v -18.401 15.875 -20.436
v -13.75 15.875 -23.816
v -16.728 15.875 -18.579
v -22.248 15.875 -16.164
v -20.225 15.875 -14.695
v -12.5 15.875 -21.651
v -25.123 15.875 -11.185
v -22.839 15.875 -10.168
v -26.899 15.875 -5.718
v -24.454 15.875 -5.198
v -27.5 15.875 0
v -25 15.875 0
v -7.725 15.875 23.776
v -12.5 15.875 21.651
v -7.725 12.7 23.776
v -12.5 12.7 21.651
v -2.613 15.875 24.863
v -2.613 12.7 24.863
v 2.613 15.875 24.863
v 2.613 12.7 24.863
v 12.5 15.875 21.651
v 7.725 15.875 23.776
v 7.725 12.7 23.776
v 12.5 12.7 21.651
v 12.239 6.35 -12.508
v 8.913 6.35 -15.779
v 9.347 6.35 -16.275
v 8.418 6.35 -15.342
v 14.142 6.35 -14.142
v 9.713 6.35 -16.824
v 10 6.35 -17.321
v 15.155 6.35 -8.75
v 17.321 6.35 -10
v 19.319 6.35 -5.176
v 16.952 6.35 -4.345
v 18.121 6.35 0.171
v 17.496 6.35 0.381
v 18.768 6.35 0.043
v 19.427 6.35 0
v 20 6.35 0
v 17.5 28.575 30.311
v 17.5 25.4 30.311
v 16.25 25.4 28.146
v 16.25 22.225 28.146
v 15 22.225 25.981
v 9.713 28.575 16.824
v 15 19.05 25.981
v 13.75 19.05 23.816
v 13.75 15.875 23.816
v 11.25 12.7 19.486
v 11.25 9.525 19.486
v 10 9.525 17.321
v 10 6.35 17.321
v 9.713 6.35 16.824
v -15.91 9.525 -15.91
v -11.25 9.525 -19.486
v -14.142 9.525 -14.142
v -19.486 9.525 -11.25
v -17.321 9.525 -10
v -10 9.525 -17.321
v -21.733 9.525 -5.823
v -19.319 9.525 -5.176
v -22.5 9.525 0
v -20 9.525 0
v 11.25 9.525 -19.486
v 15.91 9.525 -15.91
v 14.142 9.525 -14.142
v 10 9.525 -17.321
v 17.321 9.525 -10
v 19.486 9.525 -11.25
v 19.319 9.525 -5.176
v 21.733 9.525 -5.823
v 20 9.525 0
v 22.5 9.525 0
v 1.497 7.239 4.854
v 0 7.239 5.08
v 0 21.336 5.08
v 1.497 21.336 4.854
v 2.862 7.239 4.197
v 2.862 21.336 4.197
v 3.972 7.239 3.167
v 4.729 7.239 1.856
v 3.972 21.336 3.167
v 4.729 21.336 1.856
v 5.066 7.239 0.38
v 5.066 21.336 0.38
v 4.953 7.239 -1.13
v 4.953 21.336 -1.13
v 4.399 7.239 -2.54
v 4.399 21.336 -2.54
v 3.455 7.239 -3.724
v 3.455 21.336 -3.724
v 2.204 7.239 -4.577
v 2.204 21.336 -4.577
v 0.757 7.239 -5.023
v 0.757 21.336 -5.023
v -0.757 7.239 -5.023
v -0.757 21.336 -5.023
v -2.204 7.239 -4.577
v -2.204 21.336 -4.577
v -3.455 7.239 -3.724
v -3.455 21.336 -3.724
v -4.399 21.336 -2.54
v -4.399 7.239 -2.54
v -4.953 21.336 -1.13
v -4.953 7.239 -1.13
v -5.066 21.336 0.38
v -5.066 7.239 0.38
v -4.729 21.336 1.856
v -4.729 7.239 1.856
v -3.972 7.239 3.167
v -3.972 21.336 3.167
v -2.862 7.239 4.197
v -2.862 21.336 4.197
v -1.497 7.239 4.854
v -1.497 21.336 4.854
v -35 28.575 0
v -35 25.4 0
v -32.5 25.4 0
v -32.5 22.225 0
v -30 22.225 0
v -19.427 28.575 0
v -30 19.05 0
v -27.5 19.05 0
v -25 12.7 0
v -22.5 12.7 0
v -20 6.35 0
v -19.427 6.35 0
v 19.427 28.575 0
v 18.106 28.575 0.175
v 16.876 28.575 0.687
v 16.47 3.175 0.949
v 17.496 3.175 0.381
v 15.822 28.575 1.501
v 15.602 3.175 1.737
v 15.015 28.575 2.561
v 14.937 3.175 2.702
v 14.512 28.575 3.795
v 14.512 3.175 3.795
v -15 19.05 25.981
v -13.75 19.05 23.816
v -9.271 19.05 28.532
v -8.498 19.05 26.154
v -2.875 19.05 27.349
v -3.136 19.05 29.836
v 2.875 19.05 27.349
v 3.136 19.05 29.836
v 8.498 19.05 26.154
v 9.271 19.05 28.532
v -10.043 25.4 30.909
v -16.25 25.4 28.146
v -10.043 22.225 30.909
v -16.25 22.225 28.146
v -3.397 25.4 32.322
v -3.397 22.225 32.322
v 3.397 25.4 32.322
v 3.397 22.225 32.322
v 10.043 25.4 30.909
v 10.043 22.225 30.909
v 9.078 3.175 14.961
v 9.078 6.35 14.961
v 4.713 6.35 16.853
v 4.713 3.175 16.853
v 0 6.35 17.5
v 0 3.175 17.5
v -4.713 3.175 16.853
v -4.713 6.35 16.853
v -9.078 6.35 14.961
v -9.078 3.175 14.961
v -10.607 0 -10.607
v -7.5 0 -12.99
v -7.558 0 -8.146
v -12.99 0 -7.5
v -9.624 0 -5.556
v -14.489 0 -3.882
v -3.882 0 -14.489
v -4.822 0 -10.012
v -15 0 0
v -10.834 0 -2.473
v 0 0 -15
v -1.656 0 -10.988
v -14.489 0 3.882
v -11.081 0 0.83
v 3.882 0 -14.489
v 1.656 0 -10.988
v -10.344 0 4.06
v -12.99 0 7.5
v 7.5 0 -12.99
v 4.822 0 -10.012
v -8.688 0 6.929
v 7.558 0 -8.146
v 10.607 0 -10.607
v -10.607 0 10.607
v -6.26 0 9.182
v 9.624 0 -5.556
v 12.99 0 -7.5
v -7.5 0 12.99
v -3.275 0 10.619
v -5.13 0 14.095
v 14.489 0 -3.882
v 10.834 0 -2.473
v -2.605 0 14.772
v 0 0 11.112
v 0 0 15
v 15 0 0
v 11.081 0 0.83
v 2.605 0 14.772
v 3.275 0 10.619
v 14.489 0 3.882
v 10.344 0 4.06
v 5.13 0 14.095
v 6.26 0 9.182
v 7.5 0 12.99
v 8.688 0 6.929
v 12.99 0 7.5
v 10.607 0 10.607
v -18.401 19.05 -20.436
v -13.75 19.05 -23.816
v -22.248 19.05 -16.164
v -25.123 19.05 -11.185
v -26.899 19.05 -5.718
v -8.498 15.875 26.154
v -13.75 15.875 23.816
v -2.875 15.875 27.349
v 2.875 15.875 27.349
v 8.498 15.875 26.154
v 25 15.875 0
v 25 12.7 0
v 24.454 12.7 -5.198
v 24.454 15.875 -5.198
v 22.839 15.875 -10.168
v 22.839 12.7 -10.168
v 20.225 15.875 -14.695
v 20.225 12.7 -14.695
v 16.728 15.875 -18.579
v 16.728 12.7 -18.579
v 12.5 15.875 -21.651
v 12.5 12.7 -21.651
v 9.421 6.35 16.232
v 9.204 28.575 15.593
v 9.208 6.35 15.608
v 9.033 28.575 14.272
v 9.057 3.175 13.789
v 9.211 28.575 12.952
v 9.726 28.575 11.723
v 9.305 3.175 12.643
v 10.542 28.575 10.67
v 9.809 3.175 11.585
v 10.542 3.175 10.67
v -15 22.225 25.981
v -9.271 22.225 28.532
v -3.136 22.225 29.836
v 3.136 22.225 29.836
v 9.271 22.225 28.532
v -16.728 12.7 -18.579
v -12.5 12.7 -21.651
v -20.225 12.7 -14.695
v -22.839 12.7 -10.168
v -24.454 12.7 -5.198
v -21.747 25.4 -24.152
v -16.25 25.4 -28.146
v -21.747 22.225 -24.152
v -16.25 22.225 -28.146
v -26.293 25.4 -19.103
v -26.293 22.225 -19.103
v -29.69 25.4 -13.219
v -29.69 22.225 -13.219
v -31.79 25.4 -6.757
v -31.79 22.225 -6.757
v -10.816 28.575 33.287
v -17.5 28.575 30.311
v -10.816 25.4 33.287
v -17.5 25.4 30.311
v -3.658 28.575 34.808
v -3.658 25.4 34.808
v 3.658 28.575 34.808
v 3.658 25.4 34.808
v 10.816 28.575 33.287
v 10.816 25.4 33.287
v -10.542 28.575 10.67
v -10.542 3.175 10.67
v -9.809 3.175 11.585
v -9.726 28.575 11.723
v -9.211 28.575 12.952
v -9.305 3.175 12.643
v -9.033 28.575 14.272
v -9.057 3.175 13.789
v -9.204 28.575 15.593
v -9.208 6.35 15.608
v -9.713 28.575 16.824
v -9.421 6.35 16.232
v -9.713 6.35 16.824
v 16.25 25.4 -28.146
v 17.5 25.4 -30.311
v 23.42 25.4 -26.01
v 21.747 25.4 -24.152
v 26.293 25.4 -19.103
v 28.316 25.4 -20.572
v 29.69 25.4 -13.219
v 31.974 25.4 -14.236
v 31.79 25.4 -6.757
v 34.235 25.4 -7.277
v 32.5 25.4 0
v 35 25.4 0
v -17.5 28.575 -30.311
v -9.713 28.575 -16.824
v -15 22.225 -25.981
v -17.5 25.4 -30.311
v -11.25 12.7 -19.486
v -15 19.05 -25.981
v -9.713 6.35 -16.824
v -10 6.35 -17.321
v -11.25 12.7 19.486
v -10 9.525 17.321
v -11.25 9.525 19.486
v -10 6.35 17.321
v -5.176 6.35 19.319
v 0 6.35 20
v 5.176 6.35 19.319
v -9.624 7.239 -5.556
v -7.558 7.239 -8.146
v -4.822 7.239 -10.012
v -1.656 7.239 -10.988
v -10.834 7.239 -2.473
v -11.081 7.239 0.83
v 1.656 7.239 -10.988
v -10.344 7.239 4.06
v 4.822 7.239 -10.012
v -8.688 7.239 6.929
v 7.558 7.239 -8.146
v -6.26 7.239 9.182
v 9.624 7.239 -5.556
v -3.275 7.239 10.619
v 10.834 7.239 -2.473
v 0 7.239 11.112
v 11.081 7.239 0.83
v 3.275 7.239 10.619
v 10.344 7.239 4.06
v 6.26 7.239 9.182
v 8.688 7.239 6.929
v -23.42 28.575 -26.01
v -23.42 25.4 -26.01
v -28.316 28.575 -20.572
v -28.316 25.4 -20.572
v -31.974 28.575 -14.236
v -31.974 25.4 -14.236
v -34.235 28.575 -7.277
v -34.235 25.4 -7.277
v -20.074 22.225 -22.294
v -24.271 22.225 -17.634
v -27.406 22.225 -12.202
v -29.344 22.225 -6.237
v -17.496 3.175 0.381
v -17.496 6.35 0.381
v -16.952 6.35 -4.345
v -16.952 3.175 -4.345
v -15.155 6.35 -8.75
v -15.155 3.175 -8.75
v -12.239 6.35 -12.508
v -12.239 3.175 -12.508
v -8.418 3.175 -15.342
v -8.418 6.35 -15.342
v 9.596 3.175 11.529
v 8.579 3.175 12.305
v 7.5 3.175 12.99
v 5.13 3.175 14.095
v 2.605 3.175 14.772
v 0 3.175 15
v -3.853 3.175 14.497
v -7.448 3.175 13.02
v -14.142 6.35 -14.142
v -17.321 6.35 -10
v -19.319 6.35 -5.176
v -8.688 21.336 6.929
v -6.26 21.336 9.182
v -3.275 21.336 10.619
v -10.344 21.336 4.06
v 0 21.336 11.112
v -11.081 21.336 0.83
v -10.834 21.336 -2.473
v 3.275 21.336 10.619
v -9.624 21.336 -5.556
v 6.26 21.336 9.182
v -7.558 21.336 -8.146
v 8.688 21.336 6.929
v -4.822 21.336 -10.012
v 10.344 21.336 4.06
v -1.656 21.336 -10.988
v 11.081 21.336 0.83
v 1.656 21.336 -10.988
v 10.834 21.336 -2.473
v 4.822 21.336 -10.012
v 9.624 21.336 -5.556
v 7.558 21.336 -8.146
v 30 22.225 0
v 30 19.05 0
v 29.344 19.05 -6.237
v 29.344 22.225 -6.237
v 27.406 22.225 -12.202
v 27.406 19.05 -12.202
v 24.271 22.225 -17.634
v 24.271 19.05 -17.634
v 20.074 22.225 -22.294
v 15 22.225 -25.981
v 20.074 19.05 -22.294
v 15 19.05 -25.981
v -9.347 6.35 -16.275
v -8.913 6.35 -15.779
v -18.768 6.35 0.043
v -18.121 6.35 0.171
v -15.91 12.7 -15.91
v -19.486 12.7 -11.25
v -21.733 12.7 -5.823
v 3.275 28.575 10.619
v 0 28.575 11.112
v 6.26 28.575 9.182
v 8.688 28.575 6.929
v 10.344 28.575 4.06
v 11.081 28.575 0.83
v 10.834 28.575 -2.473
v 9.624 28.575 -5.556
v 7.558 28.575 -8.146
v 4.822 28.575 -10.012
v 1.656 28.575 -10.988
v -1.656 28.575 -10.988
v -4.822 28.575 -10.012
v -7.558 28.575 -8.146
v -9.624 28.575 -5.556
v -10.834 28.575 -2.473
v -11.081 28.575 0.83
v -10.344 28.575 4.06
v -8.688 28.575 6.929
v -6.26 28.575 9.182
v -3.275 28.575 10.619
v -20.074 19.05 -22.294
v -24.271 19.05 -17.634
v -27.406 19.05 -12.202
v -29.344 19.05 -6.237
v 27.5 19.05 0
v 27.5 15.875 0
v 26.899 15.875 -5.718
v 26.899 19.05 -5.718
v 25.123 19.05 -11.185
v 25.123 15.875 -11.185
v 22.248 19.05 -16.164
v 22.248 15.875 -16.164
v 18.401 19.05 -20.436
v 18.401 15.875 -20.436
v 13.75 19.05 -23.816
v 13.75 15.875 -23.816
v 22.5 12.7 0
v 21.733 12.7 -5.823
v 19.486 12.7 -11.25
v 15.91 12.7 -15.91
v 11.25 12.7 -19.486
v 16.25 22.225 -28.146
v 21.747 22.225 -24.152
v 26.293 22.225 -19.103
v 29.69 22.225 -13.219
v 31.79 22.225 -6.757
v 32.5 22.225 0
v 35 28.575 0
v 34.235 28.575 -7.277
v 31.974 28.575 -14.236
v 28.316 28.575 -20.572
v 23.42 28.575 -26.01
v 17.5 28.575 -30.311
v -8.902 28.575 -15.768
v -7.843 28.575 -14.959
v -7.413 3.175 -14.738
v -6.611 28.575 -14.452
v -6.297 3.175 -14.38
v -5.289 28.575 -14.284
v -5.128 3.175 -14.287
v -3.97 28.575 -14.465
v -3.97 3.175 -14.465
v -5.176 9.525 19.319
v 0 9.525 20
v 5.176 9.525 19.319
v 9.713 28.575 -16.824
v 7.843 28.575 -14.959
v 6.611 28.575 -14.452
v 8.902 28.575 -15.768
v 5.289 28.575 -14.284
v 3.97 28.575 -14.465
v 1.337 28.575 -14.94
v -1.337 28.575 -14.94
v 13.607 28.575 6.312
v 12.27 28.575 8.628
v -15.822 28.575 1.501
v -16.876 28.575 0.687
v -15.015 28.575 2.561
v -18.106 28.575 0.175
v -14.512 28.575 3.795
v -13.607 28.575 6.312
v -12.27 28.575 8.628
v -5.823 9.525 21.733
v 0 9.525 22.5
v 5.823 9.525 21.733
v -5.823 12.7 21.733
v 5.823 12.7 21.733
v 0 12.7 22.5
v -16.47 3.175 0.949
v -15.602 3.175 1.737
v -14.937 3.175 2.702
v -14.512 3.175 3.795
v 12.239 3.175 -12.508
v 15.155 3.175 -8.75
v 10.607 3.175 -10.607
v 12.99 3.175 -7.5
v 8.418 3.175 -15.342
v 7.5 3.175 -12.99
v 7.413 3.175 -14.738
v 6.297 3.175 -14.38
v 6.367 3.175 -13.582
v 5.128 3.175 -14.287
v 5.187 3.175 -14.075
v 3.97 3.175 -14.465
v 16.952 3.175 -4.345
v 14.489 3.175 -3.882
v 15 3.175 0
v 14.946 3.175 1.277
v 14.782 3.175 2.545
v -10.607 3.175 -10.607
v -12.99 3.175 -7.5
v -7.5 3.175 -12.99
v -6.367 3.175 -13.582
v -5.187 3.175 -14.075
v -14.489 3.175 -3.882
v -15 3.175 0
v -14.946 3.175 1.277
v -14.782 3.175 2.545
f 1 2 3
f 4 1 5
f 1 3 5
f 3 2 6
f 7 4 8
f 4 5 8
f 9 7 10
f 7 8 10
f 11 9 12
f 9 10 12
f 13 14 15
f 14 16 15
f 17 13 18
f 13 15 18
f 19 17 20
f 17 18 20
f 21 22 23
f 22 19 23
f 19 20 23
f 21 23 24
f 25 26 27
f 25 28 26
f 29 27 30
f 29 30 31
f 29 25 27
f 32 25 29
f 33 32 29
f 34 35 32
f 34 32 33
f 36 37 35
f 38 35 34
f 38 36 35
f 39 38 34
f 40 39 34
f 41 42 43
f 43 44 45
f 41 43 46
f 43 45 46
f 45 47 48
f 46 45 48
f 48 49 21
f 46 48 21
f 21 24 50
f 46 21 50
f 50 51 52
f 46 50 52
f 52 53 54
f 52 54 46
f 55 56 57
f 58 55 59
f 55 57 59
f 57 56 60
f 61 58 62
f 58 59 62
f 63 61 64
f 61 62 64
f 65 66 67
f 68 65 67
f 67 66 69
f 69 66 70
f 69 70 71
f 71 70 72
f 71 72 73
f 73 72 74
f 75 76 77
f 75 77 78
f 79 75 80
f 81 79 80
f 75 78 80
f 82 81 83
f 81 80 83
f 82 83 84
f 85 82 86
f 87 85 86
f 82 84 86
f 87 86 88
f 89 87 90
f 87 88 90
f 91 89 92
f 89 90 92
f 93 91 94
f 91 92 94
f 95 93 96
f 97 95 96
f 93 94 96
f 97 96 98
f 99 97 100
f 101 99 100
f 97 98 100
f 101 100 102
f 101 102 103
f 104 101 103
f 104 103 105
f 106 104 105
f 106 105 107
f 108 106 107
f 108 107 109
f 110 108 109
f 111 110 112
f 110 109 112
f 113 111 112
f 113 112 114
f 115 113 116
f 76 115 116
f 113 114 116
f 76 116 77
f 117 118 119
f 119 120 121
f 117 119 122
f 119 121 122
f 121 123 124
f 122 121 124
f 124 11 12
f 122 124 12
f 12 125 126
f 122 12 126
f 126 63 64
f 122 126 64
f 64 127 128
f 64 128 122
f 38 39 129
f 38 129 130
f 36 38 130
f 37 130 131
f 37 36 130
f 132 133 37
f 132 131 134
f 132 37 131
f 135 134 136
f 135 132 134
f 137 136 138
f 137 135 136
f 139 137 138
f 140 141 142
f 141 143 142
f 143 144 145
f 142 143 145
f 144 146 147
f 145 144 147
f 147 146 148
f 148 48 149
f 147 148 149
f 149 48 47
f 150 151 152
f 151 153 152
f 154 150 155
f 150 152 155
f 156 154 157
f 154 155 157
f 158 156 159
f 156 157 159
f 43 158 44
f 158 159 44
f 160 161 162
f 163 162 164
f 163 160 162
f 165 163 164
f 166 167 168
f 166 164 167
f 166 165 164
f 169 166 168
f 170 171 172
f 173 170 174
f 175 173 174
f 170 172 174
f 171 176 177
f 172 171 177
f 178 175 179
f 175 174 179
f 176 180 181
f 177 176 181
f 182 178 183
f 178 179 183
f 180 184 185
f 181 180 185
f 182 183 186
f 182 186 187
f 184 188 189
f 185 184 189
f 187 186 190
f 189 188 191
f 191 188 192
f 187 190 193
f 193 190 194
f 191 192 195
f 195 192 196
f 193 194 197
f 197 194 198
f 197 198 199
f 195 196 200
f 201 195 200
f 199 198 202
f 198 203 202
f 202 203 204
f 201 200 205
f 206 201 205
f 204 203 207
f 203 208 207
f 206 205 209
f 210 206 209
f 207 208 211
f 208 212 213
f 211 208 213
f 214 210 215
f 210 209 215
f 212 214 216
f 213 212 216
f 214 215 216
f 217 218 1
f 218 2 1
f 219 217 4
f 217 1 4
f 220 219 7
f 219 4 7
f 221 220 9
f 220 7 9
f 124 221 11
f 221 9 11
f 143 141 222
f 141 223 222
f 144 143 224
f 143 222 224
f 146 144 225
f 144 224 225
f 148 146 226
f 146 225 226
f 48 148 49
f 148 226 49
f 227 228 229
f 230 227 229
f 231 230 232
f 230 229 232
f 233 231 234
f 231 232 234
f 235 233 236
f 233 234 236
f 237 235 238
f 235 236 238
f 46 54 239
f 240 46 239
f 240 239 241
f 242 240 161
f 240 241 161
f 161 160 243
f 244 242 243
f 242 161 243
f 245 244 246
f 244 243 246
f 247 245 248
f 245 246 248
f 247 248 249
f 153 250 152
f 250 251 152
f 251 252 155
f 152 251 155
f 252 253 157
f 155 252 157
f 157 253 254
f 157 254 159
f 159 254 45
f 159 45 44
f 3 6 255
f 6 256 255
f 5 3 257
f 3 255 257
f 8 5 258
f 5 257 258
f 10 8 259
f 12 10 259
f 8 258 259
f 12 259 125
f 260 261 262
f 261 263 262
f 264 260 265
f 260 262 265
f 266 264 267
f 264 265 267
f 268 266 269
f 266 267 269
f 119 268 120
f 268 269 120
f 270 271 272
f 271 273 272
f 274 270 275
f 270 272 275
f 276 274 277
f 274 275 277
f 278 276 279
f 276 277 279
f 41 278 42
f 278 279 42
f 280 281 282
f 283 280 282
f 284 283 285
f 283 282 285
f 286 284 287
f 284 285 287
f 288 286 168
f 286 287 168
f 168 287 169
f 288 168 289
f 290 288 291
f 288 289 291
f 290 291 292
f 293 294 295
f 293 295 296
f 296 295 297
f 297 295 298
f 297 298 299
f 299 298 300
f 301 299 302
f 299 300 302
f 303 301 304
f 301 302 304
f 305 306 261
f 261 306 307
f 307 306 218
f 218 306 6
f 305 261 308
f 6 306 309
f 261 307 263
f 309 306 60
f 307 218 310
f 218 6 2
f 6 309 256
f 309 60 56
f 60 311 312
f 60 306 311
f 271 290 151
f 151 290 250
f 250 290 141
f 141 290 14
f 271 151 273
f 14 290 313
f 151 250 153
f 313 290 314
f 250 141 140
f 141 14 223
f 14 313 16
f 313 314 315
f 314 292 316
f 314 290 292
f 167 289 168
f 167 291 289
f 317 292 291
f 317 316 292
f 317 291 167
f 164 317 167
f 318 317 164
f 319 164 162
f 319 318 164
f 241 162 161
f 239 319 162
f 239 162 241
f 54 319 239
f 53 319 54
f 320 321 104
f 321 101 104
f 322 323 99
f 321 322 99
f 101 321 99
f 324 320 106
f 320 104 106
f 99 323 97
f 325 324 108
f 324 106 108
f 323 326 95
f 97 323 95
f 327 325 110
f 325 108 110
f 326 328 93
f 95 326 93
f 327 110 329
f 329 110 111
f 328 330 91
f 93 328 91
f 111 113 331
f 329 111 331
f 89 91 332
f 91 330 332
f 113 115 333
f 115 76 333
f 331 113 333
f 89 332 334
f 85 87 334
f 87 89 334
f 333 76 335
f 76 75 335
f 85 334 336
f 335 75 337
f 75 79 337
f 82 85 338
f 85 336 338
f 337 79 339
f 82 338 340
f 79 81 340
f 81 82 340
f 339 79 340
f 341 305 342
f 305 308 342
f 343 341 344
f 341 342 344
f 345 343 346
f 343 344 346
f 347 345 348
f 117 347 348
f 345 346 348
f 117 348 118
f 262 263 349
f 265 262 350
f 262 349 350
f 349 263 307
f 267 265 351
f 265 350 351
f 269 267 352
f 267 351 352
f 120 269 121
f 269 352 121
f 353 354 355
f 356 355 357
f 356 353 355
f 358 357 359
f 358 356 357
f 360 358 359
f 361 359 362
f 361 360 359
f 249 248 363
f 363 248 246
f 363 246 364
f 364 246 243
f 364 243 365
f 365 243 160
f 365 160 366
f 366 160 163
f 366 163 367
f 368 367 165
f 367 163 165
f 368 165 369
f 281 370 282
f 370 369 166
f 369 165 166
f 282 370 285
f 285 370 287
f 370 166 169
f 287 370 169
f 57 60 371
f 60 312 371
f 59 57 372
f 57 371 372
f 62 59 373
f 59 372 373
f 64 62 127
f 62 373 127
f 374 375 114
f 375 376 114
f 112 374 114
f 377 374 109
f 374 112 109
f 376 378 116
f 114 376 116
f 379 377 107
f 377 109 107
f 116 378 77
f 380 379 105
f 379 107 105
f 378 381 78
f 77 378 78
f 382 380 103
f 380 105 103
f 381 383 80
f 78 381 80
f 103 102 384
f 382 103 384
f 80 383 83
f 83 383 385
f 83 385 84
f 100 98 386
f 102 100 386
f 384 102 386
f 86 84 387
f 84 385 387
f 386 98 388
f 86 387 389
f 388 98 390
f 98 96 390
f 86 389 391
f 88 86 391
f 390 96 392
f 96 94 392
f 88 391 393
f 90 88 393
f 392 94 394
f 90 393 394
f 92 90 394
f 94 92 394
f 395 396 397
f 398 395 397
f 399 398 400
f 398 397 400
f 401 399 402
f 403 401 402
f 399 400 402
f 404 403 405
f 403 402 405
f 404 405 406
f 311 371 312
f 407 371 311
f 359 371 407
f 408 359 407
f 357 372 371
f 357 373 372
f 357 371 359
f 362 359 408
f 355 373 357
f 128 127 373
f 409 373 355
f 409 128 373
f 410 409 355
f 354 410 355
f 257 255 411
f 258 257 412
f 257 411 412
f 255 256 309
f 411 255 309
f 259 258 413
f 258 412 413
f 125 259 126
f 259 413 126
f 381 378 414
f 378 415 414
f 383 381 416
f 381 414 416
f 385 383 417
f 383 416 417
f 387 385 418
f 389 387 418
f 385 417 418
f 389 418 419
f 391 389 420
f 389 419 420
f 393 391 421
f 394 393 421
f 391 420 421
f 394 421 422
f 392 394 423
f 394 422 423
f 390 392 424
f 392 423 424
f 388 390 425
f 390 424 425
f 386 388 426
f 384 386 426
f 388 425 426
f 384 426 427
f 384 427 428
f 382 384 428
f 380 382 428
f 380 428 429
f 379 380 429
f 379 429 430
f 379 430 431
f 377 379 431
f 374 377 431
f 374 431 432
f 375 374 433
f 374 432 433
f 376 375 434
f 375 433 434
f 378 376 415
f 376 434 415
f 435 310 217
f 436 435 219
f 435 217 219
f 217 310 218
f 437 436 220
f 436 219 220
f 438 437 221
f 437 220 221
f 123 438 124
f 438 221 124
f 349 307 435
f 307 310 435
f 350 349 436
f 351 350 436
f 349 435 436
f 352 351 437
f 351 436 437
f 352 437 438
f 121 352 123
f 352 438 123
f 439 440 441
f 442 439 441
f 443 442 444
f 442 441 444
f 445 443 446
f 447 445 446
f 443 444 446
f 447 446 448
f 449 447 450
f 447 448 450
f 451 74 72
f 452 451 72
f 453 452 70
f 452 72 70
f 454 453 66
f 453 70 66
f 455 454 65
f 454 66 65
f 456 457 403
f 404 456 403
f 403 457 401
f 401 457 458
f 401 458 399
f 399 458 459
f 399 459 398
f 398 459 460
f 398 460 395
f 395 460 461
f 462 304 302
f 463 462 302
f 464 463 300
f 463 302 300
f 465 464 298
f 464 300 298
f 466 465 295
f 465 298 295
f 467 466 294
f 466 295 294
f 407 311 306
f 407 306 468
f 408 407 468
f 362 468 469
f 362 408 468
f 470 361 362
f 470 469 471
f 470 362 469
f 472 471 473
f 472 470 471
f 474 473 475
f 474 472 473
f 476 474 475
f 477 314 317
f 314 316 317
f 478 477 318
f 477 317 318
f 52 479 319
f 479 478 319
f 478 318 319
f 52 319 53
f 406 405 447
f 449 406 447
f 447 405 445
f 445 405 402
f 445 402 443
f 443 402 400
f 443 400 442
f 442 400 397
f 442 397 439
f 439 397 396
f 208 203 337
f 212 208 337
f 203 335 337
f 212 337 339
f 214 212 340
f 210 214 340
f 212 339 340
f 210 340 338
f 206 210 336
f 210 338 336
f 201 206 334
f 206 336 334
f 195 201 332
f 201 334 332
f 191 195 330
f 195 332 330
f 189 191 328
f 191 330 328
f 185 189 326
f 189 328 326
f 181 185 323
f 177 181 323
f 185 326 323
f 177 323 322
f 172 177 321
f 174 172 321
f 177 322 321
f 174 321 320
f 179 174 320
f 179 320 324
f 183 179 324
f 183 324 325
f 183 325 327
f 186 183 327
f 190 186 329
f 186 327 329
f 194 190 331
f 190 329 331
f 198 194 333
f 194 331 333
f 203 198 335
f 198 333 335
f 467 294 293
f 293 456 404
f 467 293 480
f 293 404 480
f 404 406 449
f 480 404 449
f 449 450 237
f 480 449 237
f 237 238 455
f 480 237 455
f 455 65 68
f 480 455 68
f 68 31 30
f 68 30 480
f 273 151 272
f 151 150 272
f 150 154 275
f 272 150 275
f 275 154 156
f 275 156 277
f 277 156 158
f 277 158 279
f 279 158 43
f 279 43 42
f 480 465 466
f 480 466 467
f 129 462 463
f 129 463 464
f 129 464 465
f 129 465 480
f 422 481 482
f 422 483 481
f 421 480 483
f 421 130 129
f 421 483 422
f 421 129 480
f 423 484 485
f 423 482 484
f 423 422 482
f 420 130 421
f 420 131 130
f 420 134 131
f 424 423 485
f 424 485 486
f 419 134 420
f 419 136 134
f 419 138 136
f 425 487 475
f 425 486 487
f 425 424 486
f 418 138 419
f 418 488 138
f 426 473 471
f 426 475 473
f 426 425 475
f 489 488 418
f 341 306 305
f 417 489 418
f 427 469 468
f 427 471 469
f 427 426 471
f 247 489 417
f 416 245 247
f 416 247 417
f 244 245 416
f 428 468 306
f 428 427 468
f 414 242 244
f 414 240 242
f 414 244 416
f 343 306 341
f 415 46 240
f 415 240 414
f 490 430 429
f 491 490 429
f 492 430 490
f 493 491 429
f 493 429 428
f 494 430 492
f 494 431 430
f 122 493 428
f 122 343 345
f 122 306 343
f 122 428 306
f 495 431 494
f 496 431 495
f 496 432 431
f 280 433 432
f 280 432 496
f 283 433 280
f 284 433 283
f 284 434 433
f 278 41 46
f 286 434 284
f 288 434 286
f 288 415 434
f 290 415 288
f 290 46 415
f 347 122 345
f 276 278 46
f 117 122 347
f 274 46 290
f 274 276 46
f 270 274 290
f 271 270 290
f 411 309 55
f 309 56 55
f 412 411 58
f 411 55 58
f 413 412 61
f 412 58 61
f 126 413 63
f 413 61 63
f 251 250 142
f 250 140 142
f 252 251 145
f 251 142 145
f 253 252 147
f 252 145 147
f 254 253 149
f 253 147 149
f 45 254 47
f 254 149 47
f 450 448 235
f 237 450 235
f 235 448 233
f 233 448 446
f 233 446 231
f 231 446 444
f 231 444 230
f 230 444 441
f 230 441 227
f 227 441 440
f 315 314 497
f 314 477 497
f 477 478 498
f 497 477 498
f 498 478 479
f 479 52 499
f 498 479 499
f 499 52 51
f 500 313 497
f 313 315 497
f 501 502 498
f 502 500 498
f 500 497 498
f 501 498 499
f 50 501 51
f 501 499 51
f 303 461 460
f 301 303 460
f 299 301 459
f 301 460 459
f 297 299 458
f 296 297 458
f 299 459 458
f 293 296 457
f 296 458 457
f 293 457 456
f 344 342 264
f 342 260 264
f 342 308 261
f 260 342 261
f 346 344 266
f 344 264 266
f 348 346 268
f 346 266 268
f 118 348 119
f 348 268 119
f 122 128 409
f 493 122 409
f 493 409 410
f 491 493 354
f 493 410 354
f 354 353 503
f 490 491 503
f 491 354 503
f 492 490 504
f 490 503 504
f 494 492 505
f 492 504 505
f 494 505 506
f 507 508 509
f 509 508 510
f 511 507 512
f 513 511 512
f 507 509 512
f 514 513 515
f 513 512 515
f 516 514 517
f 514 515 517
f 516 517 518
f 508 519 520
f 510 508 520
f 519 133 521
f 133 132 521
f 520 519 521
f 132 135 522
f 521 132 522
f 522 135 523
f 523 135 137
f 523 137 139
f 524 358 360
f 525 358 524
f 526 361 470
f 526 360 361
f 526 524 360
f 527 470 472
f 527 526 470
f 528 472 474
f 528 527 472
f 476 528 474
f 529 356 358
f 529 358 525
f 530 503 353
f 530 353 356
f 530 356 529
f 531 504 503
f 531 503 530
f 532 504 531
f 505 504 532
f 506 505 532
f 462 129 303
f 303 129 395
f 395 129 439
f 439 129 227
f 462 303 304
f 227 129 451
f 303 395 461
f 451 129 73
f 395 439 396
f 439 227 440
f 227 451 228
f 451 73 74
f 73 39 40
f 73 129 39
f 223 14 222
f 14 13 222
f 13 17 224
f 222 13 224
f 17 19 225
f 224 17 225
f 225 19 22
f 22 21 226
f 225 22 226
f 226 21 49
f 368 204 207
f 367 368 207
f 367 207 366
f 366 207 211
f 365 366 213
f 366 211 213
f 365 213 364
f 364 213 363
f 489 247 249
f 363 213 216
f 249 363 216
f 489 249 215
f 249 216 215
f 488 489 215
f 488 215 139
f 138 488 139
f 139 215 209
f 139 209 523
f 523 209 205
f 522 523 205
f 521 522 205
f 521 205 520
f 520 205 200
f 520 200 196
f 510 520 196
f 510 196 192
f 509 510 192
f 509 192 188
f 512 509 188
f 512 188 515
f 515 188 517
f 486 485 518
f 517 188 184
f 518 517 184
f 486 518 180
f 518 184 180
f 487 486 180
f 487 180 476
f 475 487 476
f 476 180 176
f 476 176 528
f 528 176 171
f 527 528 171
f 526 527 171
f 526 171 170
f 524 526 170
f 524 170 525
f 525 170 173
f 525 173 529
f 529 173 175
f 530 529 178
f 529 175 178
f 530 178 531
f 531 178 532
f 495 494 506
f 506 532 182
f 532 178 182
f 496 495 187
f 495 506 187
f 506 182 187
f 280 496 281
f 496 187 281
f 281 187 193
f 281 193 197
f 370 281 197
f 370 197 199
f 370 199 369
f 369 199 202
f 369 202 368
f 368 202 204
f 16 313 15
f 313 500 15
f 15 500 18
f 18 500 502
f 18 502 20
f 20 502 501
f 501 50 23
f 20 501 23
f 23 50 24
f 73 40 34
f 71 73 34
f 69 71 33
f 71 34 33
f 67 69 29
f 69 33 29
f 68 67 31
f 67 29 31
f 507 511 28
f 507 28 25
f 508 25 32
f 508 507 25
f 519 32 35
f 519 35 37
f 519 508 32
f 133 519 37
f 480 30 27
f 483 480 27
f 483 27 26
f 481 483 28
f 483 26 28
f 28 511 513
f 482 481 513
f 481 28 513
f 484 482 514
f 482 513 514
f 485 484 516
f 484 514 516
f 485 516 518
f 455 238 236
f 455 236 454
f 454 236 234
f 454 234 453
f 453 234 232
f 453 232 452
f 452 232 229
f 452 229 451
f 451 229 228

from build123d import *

# Parameters (mm, degrees)
F3_DEPTH      = 28.576
F4_T4_DEPTH   = 25.4
F4_S5_R       = 17.5
F4_T6_DEPTH   = 15
F4_T11_DEPTH  = 25.4
F4_S12_R      = 17.5
F4_T13_DEPTH  = 15
F4_T18_DEPTH  = 25.4
F4_S19_R      = 17.5
F4_T20_DEPTH  = 15
F4_T25_DEPTH  = 25.4
F4_S27_R      = 17.5
F4_T28_DEPTH  = 15
F4_T32_DEPTH  = 25.4
F4_S34_R      = 17.5
F4_T35_DEPTH  = 15
F4_T39_DEPTH  = 25.4
F4_S41_R      = 17.5
F4_T42_DEPTH  = 15
F4_T46_DEPTH  = 25.4
F4_S47_R      = 17.5
F4_T48_DEPTH  = 15
F4_T53_DEPTH  = 25.4
F4_S54_R      = 17.5
F4_T55_DEPTH  = 15
F4_T60_DEPTH  = 25.4
F4_S61_R      = 17.5
F4_T62_DEPTH  = 15
F4_T67_DEPTH  = 25.4
F4_S69_R      = 17.5
F4_T70_DEPTH  = 15
F4_T74_DEPTH  = 25.4
F4_S76_R      = 17.5
F4_T77_DEPTH  = 15
F4_T81_DEPTH  = 25.4
F4_S83_R      = 17.5
F4_T84_DEPTH  = 15
F4_T88_DEPTH  = 25.4
F4_S89_R      = 17.5
F4_T90_DEPTH  = 15
F4_T95_DEPTH  = 25.4
F4_S96_R      = 17.5
F4_T97_DEPTH  = 15
F4_T102_DEPTH = 25.4
F4_S103_R     = 17.5
F4_T104_DEPTH = 15
F4_T109_DEPTH = 25.4
F4_S111_R     = 17.5
F4_T112_DEPTH = 15
F4_T116_DEPTH = 25.4
F4_S118_R     = 17.5
F4_T119_DEPTH = 15
F4_T123_DEPTH = 25.4
F4_S125_R     = 17.5
F4_T126_DEPTH = 15


# Not quite as in the source:
# - a fillet or chamfer that OpenCascade refuses, or shapes differently, is made with other operations: its cross-section is extruded or revolved along the edge and cut away or added


with BuildPart() as f1:
    # F0 (on Right) → F1 (revolve)
    with BuildSketch(Plane.YZ):
        Polygon((0, 15), (0, 11.1125), (7.239, 11.1125), (7.239, 5.08), (21.336, 5.08), (21.336, 11.1125), (28.575, 11.1125), (28.575, 35), (25.4, 35), (25.4, 32.5), (22.225, 32.5), (22.225, 30), (19.05, 30), (19.05, 27.5), (15.875, 27.5), (15.875, 25), (12.7, 25), (12.7, 22.5), (9.525, 22.5), (9.525, 20), (6.35, 20), (6.35, 17.5), (3.175, 17.5), (3.175, 15), align=None)
    revolve(axis=Axis((0, 14.2875, 0), (0, 1, 0)))

    # F2 (on Front) → F3 (cut, through all)
    with BuildSketch(Plane.XZ):
        with BuildLine():
            ThreePointArc((-15, 0), (-12.9903810568, 7.5), (-7.5, 12.9903810568))
            Line((-7.5, 12.9903810568), (-17.5, 30.3108891325))
            ThreePointArc((-17.5, 30.3108891325), (-30.3108891325, 17.5), (-35, 0))
            Line((-35, 0), (-15, 0))
        make_face()
        with BuildLine():
            ThreePointArc((7.5, 12.9903810568), (12.9903810568, 7.5), (15, 0))
            Line((15, 0), (35, 0))
            ThreePointArc((35, 0), (30.3108891325, 17.5), (17.5, 30.3108891325))
            Line((17.5, 30.3108891325), (7.5, 12.9903810568))
        make_face()
        with BuildLine():
            Line((17.5, -30.3108891325), (7.5, -12.9903810568))
            ThreePointArc((7.5, -12.9903810568), (0, -15), (-7.5, -12.9903810568))
            Line((-7.5, -12.9903810568), (-17.5, -30.3108891325))
            ThreePointArc((-17.5, -30.3108891325), (0, -35), (17.5, -30.3108891325))
        make_face()
    extrude(amount=-F3_DEPTH, mode=Mode.SUBTRACT)

    # F4: fillet of radius 5.08 on 6 edges, made by hand


with BuildPart() as f4_tool2:
    # F4_s3 → F4_t4 (new body)
    with BuildSketch(Plane.XZ.offset(-3.175)):
        with BuildLine():
            ThreePointArc((19.4267856322, 0), (16.3221367597, 1.059110126), (14.5120410599, 3.7948207171))
            ThreePointArc((14.5120410599, 3.7948207171), (14.8775101394, 1.9130321614), (15, 0))
            Line((15, 0), (19.4267856322, 0))
        make_face()
    extrude(amount=-F4_T4_DEPTH)

    # F4_s5 → F4_t6 (intersect, symmetric)
    with BuildSketch(Plane.XZ.offset(-15.9)):
        Circle(F4_S5_R)
    extrude(amount=F4_T6_DEPTH, both=True, mode=Mode.INTERSECT)

    split(bisect_by=Plane.XZ.offset(-6.35), keep=Keep.TOP)


with BuildPart() as f1_1:
    add(f1.part)

    # F4_t1: union F4_tool2
    add(f4_tool2.part)


with BuildPart() as f4_tool9:
    # F4_s10 → F4_t11 (new body)
    with BuildSketch(Plane.XZ.offset(-3.175)):
        with BuildLine():
            ThreePointArc((19.4267856322, 0), (16.3221367597, 1.059110126), (14.5120410599, 3.7948207171))
            ThreePointArc((14.5120410599, 3.7948207171), (14.8775101394, 1.9130321614), (15, 0))
            Line((15, 0), (19.4267856322, 0))
        make_face()
    extrude(amount=-F4_T11_DEPTH)

    # F4_s12 → F4_t13 (cut, symmetric)
    with BuildSketch(Plane.XZ.offset(-15.9)):
        Circle(F4_S12_R)
    extrude(amount=F4_T13_DEPTH, both=True, mode=Mode.SUBTRACT)

    split(bisect_by=Plane.XZ.offset(-6.35), keep=Keep.BOTTOM)


with BuildPart() as f1_2:
    add(f1_1.part)

    # F4_t8: union F4_tool9
    add(f4_tool9.part)


with BuildPart() as f4_tool16:
    # F4_s17 → F4_t18 (new body)
    with BuildSketch(Plane.XZ.offset(-3.175)):
        with BuildLine():
            ThreePointArc((19.4267856322, 0), (16.3221367597, 1.059110126), (14.5120410599, 3.7948207171))
            ThreePointArc((14.5120410599, 3.7948207171), (14.8775101394, 1.9130321614), (15, 0))
            Line((15, 0), (19.4267856322, 0))
        make_face()
    extrude(amount=-F4_T18_DEPTH)

    # F4_s19 → F4_t20 (intersect, symmetric)
    with BuildSketch(Plane.XZ.offset(-15.9)):
        Circle(F4_S19_R)
    extrude(amount=F4_T20_DEPTH, both=True, mode=Mode.INTERSECT)

    split(bisect_by=Plane.XZ.offset(-6.35), keep=Keep.BOTTOM)


with BuildPart() as f1_3:
    add(f1_2.part)

    # F4_t15: union F4_tool16
    add(f4_tool16.part)


with BuildPart() as f4_tool23:
    # F4_s24 → F4_t25 (new body)
    with BuildSketch(Plane.XZ.offset(-3.175)):
        with BuildLine():
            ThreePointArc((9.7133928161, 16.8240898714), (9.0782846544, 13.6058300149), (10.5424316738, 10.6703858601))
            ThreePointArc((10.5424316738, 10.6703858601), (9.0954895198, 11.9277856451), (7.5, 12.9903810568))
            Line((7.5, 12.9903810568), (9.7133928161, 16.8240898714))
        make_face()
    extrude(amount=-F4_T25_DEPTH)

    split(bisect_by=Plane.XZ.offset(-6.35), keep=Keep.TOP)

    # F4_s27 → F4_t28 (intersect, symmetric)
    with BuildSketch(Plane.XZ.offset(-15.9)):
        Circle(F4_S27_R)
    extrude(amount=F4_T28_DEPTH, both=True, mode=Mode.INTERSECT)


with BuildPart() as f1_4:
    add(f1_3.part)

    # F4_t22: union F4_tool23
    add(f4_tool23.part)


with BuildPart() as f4_tool30:
    # F4_s31 → F4_t32 (new body)
    with BuildSketch(Plane.XZ.offset(-3.175)):
        with BuildLine():
            ThreePointArc((9.7133928161, 16.8240898714), (9.0782846544, 13.6058300149), (10.5424316738, 10.6703858601))
            ThreePointArc((10.5424316738, 10.6703858601), (9.0954895198, 11.9277856451), (7.5, 12.9903810568))
            Line((7.5, 12.9903810568), (9.7133928161, 16.8240898714))
        make_face()
    extrude(amount=-F4_T32_DEPTH)

    split(bisect_by=Plane.XZ.offset(-6.35), keep=Keep.BOTTOM)

    # F4_s34 → F4_t35 (cut, symmetric)
    with BuildSketch(Plane.XZ.offset(-15.9)):
        Circle(F4_S34_R)
    extrude(amount=F4_T35_DEPTH, both=True, mode=Mode.SUBTRACT)


with BuildPart() as f1_5:
    add(f1_4.part)

    # F4_t29: union F4_tool30
    add(f4_tool30.part)


with BuildPart() as f4_tool37:
    # F4_s38 → F4_t39 (new body)
    with BuildSketch(Plane.XZ.offset(-3.175)):
        with BuildLine():
            ThreePointArc((9.7133928161, 16.8240898714), (9.0782846544, 13.6058300149), (10.5424316738, 10.6703858601))
            ThreePointArc((10.5424316738, 10.6703858601), (9.0954895198, 11.9277856451), (7.5, 12.9903810568))
            Line((7.5, 12.9903810568), (9.7133928161, 16.8240898714))
        make_face()
    extrude(amount=-F4_T39_DEPTH)

    split(bisect_by=Plane.XZ.offset(-6.35), keep=Keep.BOTTOM)

    # F4_s41 → F4_t42 (intersect, symmetric)
    with BuildSketch(Plane.XZ.offset(-15.9)):
        Circle(F4_S41_R)
    extrude(amount=F4_T42_DEPTH, both=True, mode=Mode.INTERSECT)


with BuildPart() as f1_6:
    add(f1_5.part)

    # F4_t36: union F4_tool37
    add(f4_tool37.part)


with BuildPart() as f4_tool44:
    # F4_s45 → F4_t46 (new body)
    with BuildSketch(Plane.XZ.offset(-3.175)):
        with BuildLine():
            ThreePointArc((-10.5424316738, 10.6703858601), (-9.0782846544, 13.6058300149), (-9.7133928161, 16.8240898714))
            Line((-9.7133928161, 16.8240898714), (-7.5, 12.9903810568))
            ThreePointArc((-7.5, 12.9903810568), (-9.0954895198, 11.9277856451), (-10.5424316738, 10.6703858601))
        make_face()
    extrude(amount=-F4_T46_DEPTH)

    # F4_s47 → F4_t48 (intersect, symmetric)
    with BuildSketch(Plane.XZ.offset(-15.9)):
        Circle(F4_S47_R)
    extrude(amount=F4_T48_DEPTH, both=True, mode=Mode.INTERSECT)

    split(bisect_by=Plane.XZ.offset(-6.35), keep=Keep.TOP)


with BuildPart() as f1_7:
    add(f1_6.part)

    # F4_t43: union F4_tool44
    add(f4_tool44.part)


with BuildPart() as f4_tool51:
    # F4_s52 → F4_t53 (new body)
    with BuildSketch(Plane.XZ.offset(-3.175)):
        with BuildLine():
            ThreePointArc((-10.5424316738, 10.6703858601), (-9.0782846544, 13.6058300149), (-9.7133928161, 16.8240898714))
            Line((-9.7133928161, 16.8240898714), (-7.5, 12.9903810568))
            ThreePointArc((-7.5, 12.9903810568), (-9.0954895198, 11.9277856451), (-10.5424316738, 10.6703858601))
        make_face()
    extrude(amount=-F4_T53_DEPTH)

    # F4_s54 → F4_t55 (intersect, symmetric)
    with BuildSketch(Plane.XZ.offset(-15.9)):
        Circle(F4_S54_R)
    extrude(amount=F4_T55_DEPTH, both=True, mode=Mode.INTERSECT)

    split(bisect_by=Plane.XZ.offset(-6.35), keep=Keep.BOTTOM)


with BuildPart() as f1_8:
    add(f1_7.part)

    # F4_t50: union F4_tool51
    add(f4_tool51.part)


with BuildPart() as f4_tool58:
    # F4_s59 → F4_t60 (new body)
    with BuildSketch(Plane.XZ.offset(-3.175)):
        with BuildLine():
            ThreePointArc((-10.5424316738, 10.6703858601), (-9.0782846544, 13.6058300149), (-9.7133928161, 16.8240898714))
            Line((-9.7133928161, 16.8240898714), (-7.5, 12.9903810568))
            ThreePointArc((-7.5, 12.9903810568), (-9.0954895198, 11.9277856451), (-10.5424316738, 10.6703858601))
        make_face()
    extrude(amount=-F4_T60_DEPTH)

    # F4_s61 → F4_t62 (cut, symmetric)
    with BuildSketch(Plane.XZ.offset(-15.9)):
        Circle(F4_S61_R)
    extrude(amount=F4_T62_DEPTH, both=True, mode=Mode.SUBTRACT)

    split(bisect_by=Plane.XZ.offset(-6.35), keep=Keep.BOTTOM)


with BuildPart() as f1_9:
    add(f1_8.part)

    # F4_t57: union F4_tool58
    add(f4_tool58.part)


with BuildPart() as f4_tool65:
    # F4_s66 → F4_t67 (new body)
    with BuildSketch(Plane.XZ.offset(-3.175)):
        with BuildLine():
            ThreePointArc((-19.4267856322, 0), (-16.3221367597, 1.059110126), (-14.5120410599, 3.7948207171))
            ThreePointArc((-14.5120410599, 3.7948207171), (-14.8775101394, 1.9130321614), (-15, 0))
            Line((-15, 0), (-19.4267856322, 0))
        make_face()
    extrude(amount=-F4_T67_DEPTH)

    split(bisect_by=Plane.XZ.offset(-6.35), keep=Keep.TOP)

    # F4_s69 → F4_t70 (intersect, symmetric)
    with BuildSketch(Plane.XZ.offset(-15.9)):
        Circle(F4_S69_R)
    extrude(amount=F4_T70_DEPTH, both=True, mode=Mode.INTERSECT)


with BuildPart() as f1_10:
    add(f1_9.part)

    # F4_t64: union F4_tool65
    add(f4_tool65.part)


with BuildPart() as f4_tool72:
    # F4_s73 → F4_t74 (new body)
    with BuildSketch(Plane.XZ.offset(-3.175)):
        with BuildLine():
            ThreePointArc((-19.4267856322, 0), (-16.3221367597, 1.059110126), (-14.5120410599, 3.7948207171))
            ThreePointArc((-14.5120410599, 3.7948207171), (-14.8775101394, 1.9130321614), (-15, 0))
            Line((-15, 0), (-19.4267856322, 0))
        make_face()
    extrude(amount=-F4_T74_DEPTH)

    split(bisect_by=Plane.XZ.offset(-6.35), keep=Keep.BOTTOM)

    # F4_s76 → F4_t77 (cut, symmetric)
    with BuildSketch(Plane.XZ.offset(-15.9)):
        Circle(F4_S76_R)
    extrude(amount=F4_T77_DEPTH, both=True, mode=Mode.SUBTRACT)


with BuildPart() as f1_11:
    add(f1_10.part)

    # F4_t71: union F4_tool72
    add(f4_tool72.part)


with BuildPart() as f4_tool79:
    # F4_s80 → F4_t81 (new body)
    with BuildSketch(Plane.XZ.offset(-3.175)):
        with BuildLine():
            ThreePointArc((-19.4267856322, 0), (-16.3221367597, 1.059110126), (-14.5120410599, 3.7948207171))
            ThreePointArc((-14.5120410599, 3.7948207171), (-14.8775101394, 1.9130321614), (-15, 0))
            Line((-15, 0), (-19.4267856322, 0))
        make_face()
    extrude(amount=-F4_T81_DEPTH)

    split(bisect_by=Plane.XZ.offset(-6.35), keep=Keep.BOTTOM)

    # F4_s83 → F4_t84 (intersect, symmetric)
    with BuildSketch(Plane.XZ.offset(-15.9)):
        Circle(F4_S83_R)
    extrude(amount=F4_T84_DEPTH, both=True, mode=Mode.INTERSECT)


with BuildPart() as f1_12:
    add(f1_11.part)

    # F4_t78: union F4_tool79
    add(f4_tool79.part)


with BuildPart() as f4_tool86:
    # F4_s87 → F4_t88 (new body)
    with BuildSketch(Plane.XZ.offset(-3.175)):
        with BuildLine():
            ThreePointArc((-9.7133928161, -16.8240898714), (-7.2438521053, -14.664940141), (-3.9696093861, -14.4652065772))
            ThreePointArc((-3.9696093861, -14.4652065772), (-5.7820206197, -13.8408178065), (-7.5, -12.9903810568))
            Line((-7.5, -12.9903810568), (-9.7133928161, -16.8240898714))
        make_face()
    extrude(amount=-F4_T88_DEPTH)

    # F4_s89 → F4_t90 (intersect, symmetric)
    with BuildSketch(Plane.XZ.offset(-15.9)):
        Circle(F4_S89_R)
    extrude(amount=F4_T90_DEPTH, both=True, mode=Mode.INTERSECT)

    split(bisect_by=Plane.XZ.offset(-6.35), keep=Keep.TOP)


with BuildPart() as f1_13:
    add(f1_12.part)

    # F4_t85: union F4_tool86
    add(f4_tool86.part)


with BuildPart() as f4_tool93:
    # F4_s94 → F4_t95 (new body)
    with BuildSketch(Plane.XZ.offset(-3.175)):
        with BuildLine():
            ThreePointArc((-9.7133928161, -16.8240898714), (-7.2438521053, -14.664940141), (-3.9696093861, -14.4652065772))
            ThreePointArc((-3.9696093861, -14.4652065772), (-5.7820206197, -13.8408178065), (-7.5, -12.9903810568))
            Line((-7.5, -12.9903810568), (-9.7133928161, -16.8240898714))
        make_face()
    extrude(amount=-F4_T95_DEPTH)

    # F4_s96 → F4_t97 (cut, symmetric)
    with BuildSketch(Plane.XZ.offset(-15.9)):
        Circle(F4_S96_R)
    extrude(amount=F4_T97_DEPTH, both=True, mode=Mode.SUBTRACT)

    split(bisect_by=Plane.XZ.offset(-6.35), keep=Keep.BOTTOM)


with BuildPart() as f1_14:
    add(f1_13.part)

    # F4_t92: union F4_tool93
    add(f4_tool93.part)


with BuildPart() as f4_tool100:
    # F4_s101 → F4_t102 (new body)
    with BuildSketch(Plane.XZ.offset(-3.175)):
        with BuildLine():
            ThreePointArc((-9.7133928161, -16.8240898714), (-7.2438521053, -14.664940141), (-3.9696093861, -14.4652065772))
            ThreePointArc((-3.9696093861, -14.4652065772), (-5.7820206197, -13.8408178065), (-7.5, -12.9903810568))
            Line((-7.5, -12.9903810568), (-9.7133928161, -16.8240898714))
        make_face()
    extrude(amount=-F4_T102_DEPTH)

    # F4_s103 → F4_t104 (intersect, symmetric)
    with BuildSketch(Plane.XZ.offset(-15.9)):
        Circle(F4_S103_R)
    extrude(amount=F4_T104_DEPTH, both=True, mode=Mode.INTERSECT)

    split(bisect_by=Plane.XZ.offset(-6.35), keep=Keep.BOTTOM)


with BuildPart() as f1_15:
    add(f1_14.part)

    # F4_t99: union F4_tool100
    add(f4_tool100.part)


with BuildPart() as f4_tool107:
    # F4_s108 → F4_t109 (new body)
    with BuildSketch(Plane.XZ.offset(-3.175)):
        with BuildLine():
            ThreePointArc((9.7133928161, -16.8240898714), (7.2438521053, -14.664940141), (3.9696093861, -14.4652065772))
            ThreePointArc((3.9696093861, -14.4652065772), (5.7820206197, -13.8408178065), (7.5, -12.9903810568))
            Line((7.5, -12.9903810568), (9.7133928161, -16.8240898714))
        make_face()
    extrude(amount=-F4_T109_DEPTH)

    split(bisect_by=Plane.XZ.offset(-6.35), keep=Keep.TOP)

    # F4_s111 → F4_t112 (intersect, symmetric)
    with BuildSketch(Plane.XZ.offset(-15.9)):
        Circle(F4_S111_R)
    extrude(amount=F4_T112_DEPTH, both=True, mode=Mode.INTERSECT)


with BuildPart() as f1_16:
    add(f1_15.part)

    # F4_t106: union F4_tool107
    add(f4_tool107.part)


with BuildPart() as f4_tool114:
    # F4_s115 → F4_t116 (new body)
    with BuildSketch(Plane.XZ.offset(-3.175)):
        with BuildLine():
            ThreePointArc((9.7133928161, -16.8240898714), (7.2438521053, -14.664940141), (3.9696093861, -14.4652065772))
            ThreePointArc((3.9696093861, -14.4652065772), (5.7820206197, -13.8408178065), (7.5, -12.9903810568))
            Line((7.5, -12.9903810568), (9.7133928161, -16.8240898714))
        make_face()
    extrude(amount=-F4_T116_DEPTH)

    split(bisect_by=Plane.XZ.offset(-6.35), keep=Keep.BOTTOM)

    # F4_s118 → F4_t119 (cut, symmetric)
    with BuildSketch(Plane.XZ.offset(-15.9)):
        Circle(F4_S118_R)
    extrude(amount=F4_T119_DEPTH, both=True, mode=Mode.SUBTRACT)


with BuildPart() as f1_17:
    add(f1_16.part)

    # F4_t113: union F4_tool114
    add(f4_tool114.part)


with BuildPart() as f4_tool121:
    # F4_s122 → F4_t123 (new body)
    with BuildSketch(Plane.XZ.offset(-3.175)):
        with BuildLine():
            ThreePointArc((9.7133928161, -16.8240898714), (7.2438521053, -14.664940141), (3.9696093861, -14.4652065772))
            ThreePointArc((3.9696093861, -14.4652065772), (5.7820206197, -13.8408178065), (7.5, -12.9903810568))
            Line((7.5, -12.9903810568), (9.7133928161, -16.8240898714))
        make_face()
    extrude(amount=-F4_T123_DEPTH)

    split(bisect_by=Plane.XZ.offset(-6.35), keep=Keep.BOTTOM)

    # F4_s125 → F4_t126 (intersect, symmetric)
    with BuildSketch(Plane.XZ.offset(-15.9)):
        Circle(F4_S125_R)
    extrude(amount=F4_T126_DEPTH, both=True, mode=Mode.INTERSECT)


with BuildPart() as f1_18:
    add(f1_17.part)

    # F4_t120: union F4_tool121
    add(f4_tool121.part)


solid = f1_18.part
